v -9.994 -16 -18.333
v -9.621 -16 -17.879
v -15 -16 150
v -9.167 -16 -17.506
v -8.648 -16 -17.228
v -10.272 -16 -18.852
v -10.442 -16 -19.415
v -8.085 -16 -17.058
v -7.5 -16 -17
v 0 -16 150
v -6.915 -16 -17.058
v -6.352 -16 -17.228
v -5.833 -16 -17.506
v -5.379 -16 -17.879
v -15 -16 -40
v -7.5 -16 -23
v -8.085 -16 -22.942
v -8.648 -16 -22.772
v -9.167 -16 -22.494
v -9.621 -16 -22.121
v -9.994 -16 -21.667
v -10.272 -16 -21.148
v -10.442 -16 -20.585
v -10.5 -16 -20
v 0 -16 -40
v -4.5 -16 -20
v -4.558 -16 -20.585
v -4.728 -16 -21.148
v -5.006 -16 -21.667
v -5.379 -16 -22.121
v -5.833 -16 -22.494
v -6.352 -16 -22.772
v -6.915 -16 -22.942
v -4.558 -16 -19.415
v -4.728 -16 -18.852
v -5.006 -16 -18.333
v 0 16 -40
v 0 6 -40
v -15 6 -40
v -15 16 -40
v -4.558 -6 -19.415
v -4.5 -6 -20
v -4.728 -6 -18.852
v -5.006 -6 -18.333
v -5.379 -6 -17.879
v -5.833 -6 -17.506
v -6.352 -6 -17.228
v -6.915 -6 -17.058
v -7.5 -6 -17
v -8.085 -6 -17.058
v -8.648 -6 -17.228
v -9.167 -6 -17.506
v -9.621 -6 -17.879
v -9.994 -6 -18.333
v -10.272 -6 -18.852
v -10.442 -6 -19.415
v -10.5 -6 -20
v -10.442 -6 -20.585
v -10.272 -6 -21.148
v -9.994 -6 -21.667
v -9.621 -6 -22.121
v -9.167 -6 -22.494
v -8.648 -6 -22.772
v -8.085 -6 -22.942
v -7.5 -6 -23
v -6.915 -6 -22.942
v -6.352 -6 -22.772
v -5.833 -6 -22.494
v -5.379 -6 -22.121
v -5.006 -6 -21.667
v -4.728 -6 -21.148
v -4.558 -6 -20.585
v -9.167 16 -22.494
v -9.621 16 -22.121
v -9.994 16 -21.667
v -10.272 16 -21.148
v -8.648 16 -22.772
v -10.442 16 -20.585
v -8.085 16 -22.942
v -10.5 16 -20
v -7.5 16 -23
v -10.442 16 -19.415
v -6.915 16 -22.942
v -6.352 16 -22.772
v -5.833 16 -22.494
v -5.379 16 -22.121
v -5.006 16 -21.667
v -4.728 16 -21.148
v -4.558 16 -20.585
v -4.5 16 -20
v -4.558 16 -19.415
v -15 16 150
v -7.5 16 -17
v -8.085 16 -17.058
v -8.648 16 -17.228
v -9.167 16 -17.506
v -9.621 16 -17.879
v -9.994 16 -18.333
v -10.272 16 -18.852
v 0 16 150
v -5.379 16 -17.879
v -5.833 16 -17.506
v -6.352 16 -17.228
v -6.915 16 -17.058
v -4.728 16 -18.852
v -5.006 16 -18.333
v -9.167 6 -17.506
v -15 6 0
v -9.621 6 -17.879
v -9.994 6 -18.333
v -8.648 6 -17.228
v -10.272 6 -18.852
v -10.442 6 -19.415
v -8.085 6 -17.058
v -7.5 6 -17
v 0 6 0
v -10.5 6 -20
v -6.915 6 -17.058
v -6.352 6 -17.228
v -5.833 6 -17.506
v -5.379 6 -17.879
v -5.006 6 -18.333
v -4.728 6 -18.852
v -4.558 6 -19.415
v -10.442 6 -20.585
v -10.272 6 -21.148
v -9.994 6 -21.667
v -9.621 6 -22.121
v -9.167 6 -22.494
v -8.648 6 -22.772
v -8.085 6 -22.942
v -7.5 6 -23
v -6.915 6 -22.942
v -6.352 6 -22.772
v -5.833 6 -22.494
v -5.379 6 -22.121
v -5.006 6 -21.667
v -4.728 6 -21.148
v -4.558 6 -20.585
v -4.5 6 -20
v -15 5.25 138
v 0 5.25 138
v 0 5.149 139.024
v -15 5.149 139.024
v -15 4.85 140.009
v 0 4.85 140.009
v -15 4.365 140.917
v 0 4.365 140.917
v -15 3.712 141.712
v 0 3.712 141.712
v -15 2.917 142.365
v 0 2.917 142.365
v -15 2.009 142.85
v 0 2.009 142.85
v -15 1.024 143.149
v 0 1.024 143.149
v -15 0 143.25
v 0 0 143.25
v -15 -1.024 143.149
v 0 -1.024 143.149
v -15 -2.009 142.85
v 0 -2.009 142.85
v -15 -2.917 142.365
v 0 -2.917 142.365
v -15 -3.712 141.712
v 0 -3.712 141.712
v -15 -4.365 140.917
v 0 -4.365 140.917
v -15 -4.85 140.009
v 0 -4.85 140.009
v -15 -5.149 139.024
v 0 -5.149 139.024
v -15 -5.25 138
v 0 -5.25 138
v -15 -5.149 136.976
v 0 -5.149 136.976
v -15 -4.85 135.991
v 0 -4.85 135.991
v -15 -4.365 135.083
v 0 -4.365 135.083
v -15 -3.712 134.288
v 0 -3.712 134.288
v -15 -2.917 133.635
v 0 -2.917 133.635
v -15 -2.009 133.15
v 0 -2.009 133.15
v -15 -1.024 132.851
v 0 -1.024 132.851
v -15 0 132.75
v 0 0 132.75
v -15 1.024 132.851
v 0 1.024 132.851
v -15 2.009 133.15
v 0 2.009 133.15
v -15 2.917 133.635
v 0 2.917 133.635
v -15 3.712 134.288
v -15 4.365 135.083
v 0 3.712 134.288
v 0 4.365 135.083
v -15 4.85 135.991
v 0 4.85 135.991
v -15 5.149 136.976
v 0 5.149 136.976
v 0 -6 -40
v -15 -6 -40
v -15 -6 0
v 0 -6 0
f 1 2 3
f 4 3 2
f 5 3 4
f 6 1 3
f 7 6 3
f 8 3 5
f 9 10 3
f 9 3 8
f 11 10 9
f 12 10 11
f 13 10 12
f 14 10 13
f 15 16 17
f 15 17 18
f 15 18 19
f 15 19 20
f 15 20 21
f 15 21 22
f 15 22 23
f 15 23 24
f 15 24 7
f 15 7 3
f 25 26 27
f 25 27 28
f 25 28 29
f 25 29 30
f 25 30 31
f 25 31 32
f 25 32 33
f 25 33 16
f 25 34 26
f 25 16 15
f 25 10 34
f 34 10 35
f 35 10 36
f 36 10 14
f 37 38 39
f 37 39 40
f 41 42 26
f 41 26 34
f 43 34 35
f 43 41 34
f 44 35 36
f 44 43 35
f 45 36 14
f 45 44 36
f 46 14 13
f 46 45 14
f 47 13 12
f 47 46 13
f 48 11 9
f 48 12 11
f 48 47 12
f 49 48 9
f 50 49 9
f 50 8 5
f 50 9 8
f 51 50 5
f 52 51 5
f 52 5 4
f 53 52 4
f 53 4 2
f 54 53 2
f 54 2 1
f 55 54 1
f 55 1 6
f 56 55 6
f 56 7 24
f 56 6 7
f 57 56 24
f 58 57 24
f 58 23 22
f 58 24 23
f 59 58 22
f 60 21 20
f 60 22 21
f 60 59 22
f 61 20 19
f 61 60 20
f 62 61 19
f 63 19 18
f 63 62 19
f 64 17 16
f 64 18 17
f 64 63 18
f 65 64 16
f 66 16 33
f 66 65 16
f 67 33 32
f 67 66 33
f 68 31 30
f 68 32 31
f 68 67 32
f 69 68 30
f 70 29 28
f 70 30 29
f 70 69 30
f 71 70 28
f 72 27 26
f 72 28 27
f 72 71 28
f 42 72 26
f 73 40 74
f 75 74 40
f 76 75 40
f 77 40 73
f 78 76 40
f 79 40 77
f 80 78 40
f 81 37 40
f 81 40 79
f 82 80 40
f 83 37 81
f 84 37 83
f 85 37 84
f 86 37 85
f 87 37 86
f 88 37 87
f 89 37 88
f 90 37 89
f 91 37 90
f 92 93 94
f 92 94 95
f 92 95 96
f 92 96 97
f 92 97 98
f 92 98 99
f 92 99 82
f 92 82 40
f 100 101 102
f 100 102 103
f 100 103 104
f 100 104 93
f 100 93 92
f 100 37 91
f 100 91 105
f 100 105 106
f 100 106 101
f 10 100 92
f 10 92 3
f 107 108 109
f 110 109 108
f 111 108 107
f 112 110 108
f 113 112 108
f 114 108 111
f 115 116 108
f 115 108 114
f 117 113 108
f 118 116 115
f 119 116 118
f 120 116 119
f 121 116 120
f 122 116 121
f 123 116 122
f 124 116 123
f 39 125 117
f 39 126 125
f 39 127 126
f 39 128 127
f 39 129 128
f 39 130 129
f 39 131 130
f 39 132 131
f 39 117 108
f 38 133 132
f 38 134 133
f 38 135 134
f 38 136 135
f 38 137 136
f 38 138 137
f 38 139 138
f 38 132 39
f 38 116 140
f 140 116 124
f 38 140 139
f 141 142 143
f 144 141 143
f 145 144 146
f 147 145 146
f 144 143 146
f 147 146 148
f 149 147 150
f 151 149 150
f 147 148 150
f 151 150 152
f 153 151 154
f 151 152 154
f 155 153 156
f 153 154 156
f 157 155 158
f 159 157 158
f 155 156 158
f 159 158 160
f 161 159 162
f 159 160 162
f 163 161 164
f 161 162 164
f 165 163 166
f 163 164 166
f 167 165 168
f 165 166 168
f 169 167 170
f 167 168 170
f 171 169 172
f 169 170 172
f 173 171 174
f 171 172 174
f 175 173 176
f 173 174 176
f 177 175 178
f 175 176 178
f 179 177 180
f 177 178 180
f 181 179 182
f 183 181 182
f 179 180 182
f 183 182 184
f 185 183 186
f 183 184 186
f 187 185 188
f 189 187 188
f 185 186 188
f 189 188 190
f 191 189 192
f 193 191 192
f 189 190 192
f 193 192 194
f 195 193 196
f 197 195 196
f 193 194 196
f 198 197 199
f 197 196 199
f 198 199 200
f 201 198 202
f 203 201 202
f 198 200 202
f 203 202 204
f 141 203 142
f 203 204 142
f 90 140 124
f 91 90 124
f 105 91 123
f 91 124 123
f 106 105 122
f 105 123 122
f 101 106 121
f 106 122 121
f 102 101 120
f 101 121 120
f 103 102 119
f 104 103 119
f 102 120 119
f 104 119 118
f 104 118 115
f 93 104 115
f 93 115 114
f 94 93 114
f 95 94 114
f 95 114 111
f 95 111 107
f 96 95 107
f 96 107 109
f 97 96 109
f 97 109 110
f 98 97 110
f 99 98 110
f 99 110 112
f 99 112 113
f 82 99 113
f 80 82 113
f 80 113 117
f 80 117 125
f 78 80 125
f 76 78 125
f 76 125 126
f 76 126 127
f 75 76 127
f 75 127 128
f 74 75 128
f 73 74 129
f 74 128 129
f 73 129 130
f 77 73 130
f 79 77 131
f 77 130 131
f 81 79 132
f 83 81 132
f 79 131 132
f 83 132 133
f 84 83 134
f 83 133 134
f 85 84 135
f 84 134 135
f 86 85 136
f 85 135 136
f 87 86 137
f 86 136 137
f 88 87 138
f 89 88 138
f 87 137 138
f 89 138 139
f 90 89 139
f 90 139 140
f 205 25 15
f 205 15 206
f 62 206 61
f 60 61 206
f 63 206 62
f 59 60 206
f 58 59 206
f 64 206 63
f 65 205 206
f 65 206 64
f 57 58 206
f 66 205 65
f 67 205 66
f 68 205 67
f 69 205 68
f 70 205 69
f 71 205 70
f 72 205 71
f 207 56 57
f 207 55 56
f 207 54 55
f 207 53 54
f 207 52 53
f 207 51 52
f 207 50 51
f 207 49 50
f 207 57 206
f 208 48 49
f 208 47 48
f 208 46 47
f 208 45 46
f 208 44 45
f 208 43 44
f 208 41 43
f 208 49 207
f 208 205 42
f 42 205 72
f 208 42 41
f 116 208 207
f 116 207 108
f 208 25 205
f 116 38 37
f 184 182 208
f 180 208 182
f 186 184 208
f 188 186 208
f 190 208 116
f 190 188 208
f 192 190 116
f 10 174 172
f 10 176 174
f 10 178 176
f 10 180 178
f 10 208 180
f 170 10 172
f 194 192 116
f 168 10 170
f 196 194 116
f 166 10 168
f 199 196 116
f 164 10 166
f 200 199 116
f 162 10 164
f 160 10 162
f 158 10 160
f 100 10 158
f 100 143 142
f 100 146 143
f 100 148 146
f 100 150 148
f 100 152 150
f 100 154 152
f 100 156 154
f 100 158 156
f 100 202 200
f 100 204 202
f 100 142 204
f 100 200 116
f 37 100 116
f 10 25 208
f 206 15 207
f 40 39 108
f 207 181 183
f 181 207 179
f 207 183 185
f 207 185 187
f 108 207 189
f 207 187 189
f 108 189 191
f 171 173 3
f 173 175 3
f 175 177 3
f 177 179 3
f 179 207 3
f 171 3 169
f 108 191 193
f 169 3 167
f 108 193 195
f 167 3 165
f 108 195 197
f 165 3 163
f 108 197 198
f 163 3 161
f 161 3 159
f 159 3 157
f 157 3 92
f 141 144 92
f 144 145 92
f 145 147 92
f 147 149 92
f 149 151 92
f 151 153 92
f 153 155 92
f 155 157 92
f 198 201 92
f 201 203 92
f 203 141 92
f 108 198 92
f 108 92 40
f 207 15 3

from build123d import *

# Parameters (mm, degrees)
F0_R          = 5.25
F1_DEPTH      = 15
F2_R          = 3
F3_DEPTH      = 25
F3_DEPTH_BACK = 25


with BuildPart() as f1:
    # F0 (on Right) → F1 (new body)
    with BuildSketch(Plane.YZ):
        Polygon((-6, -40), (-6, 0), (6, 0), (6, -40), (16, -40), (16, 150), (-16, 150), (-16, -40), align=None)
        with Locations((0, 138)):
            Circle(F0_R, mode=Mode.SUBTRACT)
    extrude(amount=-F1_DEPTH)

    # F2 (on Front) → F3 (cut, two sides)
    with BuildSketch(Plane.XZ) as f3_sk:
        with Locations((-7.5, -20)):
            Circle(F2_R)
    extrude(amount=-F3_DEPTH, mode=Mode.SUBTRACT)
    extrude(f3_sk.sketch, amount=F3_DEPTH_BACK, mode=Mode.SUBTRACT)


solid = f1.part
